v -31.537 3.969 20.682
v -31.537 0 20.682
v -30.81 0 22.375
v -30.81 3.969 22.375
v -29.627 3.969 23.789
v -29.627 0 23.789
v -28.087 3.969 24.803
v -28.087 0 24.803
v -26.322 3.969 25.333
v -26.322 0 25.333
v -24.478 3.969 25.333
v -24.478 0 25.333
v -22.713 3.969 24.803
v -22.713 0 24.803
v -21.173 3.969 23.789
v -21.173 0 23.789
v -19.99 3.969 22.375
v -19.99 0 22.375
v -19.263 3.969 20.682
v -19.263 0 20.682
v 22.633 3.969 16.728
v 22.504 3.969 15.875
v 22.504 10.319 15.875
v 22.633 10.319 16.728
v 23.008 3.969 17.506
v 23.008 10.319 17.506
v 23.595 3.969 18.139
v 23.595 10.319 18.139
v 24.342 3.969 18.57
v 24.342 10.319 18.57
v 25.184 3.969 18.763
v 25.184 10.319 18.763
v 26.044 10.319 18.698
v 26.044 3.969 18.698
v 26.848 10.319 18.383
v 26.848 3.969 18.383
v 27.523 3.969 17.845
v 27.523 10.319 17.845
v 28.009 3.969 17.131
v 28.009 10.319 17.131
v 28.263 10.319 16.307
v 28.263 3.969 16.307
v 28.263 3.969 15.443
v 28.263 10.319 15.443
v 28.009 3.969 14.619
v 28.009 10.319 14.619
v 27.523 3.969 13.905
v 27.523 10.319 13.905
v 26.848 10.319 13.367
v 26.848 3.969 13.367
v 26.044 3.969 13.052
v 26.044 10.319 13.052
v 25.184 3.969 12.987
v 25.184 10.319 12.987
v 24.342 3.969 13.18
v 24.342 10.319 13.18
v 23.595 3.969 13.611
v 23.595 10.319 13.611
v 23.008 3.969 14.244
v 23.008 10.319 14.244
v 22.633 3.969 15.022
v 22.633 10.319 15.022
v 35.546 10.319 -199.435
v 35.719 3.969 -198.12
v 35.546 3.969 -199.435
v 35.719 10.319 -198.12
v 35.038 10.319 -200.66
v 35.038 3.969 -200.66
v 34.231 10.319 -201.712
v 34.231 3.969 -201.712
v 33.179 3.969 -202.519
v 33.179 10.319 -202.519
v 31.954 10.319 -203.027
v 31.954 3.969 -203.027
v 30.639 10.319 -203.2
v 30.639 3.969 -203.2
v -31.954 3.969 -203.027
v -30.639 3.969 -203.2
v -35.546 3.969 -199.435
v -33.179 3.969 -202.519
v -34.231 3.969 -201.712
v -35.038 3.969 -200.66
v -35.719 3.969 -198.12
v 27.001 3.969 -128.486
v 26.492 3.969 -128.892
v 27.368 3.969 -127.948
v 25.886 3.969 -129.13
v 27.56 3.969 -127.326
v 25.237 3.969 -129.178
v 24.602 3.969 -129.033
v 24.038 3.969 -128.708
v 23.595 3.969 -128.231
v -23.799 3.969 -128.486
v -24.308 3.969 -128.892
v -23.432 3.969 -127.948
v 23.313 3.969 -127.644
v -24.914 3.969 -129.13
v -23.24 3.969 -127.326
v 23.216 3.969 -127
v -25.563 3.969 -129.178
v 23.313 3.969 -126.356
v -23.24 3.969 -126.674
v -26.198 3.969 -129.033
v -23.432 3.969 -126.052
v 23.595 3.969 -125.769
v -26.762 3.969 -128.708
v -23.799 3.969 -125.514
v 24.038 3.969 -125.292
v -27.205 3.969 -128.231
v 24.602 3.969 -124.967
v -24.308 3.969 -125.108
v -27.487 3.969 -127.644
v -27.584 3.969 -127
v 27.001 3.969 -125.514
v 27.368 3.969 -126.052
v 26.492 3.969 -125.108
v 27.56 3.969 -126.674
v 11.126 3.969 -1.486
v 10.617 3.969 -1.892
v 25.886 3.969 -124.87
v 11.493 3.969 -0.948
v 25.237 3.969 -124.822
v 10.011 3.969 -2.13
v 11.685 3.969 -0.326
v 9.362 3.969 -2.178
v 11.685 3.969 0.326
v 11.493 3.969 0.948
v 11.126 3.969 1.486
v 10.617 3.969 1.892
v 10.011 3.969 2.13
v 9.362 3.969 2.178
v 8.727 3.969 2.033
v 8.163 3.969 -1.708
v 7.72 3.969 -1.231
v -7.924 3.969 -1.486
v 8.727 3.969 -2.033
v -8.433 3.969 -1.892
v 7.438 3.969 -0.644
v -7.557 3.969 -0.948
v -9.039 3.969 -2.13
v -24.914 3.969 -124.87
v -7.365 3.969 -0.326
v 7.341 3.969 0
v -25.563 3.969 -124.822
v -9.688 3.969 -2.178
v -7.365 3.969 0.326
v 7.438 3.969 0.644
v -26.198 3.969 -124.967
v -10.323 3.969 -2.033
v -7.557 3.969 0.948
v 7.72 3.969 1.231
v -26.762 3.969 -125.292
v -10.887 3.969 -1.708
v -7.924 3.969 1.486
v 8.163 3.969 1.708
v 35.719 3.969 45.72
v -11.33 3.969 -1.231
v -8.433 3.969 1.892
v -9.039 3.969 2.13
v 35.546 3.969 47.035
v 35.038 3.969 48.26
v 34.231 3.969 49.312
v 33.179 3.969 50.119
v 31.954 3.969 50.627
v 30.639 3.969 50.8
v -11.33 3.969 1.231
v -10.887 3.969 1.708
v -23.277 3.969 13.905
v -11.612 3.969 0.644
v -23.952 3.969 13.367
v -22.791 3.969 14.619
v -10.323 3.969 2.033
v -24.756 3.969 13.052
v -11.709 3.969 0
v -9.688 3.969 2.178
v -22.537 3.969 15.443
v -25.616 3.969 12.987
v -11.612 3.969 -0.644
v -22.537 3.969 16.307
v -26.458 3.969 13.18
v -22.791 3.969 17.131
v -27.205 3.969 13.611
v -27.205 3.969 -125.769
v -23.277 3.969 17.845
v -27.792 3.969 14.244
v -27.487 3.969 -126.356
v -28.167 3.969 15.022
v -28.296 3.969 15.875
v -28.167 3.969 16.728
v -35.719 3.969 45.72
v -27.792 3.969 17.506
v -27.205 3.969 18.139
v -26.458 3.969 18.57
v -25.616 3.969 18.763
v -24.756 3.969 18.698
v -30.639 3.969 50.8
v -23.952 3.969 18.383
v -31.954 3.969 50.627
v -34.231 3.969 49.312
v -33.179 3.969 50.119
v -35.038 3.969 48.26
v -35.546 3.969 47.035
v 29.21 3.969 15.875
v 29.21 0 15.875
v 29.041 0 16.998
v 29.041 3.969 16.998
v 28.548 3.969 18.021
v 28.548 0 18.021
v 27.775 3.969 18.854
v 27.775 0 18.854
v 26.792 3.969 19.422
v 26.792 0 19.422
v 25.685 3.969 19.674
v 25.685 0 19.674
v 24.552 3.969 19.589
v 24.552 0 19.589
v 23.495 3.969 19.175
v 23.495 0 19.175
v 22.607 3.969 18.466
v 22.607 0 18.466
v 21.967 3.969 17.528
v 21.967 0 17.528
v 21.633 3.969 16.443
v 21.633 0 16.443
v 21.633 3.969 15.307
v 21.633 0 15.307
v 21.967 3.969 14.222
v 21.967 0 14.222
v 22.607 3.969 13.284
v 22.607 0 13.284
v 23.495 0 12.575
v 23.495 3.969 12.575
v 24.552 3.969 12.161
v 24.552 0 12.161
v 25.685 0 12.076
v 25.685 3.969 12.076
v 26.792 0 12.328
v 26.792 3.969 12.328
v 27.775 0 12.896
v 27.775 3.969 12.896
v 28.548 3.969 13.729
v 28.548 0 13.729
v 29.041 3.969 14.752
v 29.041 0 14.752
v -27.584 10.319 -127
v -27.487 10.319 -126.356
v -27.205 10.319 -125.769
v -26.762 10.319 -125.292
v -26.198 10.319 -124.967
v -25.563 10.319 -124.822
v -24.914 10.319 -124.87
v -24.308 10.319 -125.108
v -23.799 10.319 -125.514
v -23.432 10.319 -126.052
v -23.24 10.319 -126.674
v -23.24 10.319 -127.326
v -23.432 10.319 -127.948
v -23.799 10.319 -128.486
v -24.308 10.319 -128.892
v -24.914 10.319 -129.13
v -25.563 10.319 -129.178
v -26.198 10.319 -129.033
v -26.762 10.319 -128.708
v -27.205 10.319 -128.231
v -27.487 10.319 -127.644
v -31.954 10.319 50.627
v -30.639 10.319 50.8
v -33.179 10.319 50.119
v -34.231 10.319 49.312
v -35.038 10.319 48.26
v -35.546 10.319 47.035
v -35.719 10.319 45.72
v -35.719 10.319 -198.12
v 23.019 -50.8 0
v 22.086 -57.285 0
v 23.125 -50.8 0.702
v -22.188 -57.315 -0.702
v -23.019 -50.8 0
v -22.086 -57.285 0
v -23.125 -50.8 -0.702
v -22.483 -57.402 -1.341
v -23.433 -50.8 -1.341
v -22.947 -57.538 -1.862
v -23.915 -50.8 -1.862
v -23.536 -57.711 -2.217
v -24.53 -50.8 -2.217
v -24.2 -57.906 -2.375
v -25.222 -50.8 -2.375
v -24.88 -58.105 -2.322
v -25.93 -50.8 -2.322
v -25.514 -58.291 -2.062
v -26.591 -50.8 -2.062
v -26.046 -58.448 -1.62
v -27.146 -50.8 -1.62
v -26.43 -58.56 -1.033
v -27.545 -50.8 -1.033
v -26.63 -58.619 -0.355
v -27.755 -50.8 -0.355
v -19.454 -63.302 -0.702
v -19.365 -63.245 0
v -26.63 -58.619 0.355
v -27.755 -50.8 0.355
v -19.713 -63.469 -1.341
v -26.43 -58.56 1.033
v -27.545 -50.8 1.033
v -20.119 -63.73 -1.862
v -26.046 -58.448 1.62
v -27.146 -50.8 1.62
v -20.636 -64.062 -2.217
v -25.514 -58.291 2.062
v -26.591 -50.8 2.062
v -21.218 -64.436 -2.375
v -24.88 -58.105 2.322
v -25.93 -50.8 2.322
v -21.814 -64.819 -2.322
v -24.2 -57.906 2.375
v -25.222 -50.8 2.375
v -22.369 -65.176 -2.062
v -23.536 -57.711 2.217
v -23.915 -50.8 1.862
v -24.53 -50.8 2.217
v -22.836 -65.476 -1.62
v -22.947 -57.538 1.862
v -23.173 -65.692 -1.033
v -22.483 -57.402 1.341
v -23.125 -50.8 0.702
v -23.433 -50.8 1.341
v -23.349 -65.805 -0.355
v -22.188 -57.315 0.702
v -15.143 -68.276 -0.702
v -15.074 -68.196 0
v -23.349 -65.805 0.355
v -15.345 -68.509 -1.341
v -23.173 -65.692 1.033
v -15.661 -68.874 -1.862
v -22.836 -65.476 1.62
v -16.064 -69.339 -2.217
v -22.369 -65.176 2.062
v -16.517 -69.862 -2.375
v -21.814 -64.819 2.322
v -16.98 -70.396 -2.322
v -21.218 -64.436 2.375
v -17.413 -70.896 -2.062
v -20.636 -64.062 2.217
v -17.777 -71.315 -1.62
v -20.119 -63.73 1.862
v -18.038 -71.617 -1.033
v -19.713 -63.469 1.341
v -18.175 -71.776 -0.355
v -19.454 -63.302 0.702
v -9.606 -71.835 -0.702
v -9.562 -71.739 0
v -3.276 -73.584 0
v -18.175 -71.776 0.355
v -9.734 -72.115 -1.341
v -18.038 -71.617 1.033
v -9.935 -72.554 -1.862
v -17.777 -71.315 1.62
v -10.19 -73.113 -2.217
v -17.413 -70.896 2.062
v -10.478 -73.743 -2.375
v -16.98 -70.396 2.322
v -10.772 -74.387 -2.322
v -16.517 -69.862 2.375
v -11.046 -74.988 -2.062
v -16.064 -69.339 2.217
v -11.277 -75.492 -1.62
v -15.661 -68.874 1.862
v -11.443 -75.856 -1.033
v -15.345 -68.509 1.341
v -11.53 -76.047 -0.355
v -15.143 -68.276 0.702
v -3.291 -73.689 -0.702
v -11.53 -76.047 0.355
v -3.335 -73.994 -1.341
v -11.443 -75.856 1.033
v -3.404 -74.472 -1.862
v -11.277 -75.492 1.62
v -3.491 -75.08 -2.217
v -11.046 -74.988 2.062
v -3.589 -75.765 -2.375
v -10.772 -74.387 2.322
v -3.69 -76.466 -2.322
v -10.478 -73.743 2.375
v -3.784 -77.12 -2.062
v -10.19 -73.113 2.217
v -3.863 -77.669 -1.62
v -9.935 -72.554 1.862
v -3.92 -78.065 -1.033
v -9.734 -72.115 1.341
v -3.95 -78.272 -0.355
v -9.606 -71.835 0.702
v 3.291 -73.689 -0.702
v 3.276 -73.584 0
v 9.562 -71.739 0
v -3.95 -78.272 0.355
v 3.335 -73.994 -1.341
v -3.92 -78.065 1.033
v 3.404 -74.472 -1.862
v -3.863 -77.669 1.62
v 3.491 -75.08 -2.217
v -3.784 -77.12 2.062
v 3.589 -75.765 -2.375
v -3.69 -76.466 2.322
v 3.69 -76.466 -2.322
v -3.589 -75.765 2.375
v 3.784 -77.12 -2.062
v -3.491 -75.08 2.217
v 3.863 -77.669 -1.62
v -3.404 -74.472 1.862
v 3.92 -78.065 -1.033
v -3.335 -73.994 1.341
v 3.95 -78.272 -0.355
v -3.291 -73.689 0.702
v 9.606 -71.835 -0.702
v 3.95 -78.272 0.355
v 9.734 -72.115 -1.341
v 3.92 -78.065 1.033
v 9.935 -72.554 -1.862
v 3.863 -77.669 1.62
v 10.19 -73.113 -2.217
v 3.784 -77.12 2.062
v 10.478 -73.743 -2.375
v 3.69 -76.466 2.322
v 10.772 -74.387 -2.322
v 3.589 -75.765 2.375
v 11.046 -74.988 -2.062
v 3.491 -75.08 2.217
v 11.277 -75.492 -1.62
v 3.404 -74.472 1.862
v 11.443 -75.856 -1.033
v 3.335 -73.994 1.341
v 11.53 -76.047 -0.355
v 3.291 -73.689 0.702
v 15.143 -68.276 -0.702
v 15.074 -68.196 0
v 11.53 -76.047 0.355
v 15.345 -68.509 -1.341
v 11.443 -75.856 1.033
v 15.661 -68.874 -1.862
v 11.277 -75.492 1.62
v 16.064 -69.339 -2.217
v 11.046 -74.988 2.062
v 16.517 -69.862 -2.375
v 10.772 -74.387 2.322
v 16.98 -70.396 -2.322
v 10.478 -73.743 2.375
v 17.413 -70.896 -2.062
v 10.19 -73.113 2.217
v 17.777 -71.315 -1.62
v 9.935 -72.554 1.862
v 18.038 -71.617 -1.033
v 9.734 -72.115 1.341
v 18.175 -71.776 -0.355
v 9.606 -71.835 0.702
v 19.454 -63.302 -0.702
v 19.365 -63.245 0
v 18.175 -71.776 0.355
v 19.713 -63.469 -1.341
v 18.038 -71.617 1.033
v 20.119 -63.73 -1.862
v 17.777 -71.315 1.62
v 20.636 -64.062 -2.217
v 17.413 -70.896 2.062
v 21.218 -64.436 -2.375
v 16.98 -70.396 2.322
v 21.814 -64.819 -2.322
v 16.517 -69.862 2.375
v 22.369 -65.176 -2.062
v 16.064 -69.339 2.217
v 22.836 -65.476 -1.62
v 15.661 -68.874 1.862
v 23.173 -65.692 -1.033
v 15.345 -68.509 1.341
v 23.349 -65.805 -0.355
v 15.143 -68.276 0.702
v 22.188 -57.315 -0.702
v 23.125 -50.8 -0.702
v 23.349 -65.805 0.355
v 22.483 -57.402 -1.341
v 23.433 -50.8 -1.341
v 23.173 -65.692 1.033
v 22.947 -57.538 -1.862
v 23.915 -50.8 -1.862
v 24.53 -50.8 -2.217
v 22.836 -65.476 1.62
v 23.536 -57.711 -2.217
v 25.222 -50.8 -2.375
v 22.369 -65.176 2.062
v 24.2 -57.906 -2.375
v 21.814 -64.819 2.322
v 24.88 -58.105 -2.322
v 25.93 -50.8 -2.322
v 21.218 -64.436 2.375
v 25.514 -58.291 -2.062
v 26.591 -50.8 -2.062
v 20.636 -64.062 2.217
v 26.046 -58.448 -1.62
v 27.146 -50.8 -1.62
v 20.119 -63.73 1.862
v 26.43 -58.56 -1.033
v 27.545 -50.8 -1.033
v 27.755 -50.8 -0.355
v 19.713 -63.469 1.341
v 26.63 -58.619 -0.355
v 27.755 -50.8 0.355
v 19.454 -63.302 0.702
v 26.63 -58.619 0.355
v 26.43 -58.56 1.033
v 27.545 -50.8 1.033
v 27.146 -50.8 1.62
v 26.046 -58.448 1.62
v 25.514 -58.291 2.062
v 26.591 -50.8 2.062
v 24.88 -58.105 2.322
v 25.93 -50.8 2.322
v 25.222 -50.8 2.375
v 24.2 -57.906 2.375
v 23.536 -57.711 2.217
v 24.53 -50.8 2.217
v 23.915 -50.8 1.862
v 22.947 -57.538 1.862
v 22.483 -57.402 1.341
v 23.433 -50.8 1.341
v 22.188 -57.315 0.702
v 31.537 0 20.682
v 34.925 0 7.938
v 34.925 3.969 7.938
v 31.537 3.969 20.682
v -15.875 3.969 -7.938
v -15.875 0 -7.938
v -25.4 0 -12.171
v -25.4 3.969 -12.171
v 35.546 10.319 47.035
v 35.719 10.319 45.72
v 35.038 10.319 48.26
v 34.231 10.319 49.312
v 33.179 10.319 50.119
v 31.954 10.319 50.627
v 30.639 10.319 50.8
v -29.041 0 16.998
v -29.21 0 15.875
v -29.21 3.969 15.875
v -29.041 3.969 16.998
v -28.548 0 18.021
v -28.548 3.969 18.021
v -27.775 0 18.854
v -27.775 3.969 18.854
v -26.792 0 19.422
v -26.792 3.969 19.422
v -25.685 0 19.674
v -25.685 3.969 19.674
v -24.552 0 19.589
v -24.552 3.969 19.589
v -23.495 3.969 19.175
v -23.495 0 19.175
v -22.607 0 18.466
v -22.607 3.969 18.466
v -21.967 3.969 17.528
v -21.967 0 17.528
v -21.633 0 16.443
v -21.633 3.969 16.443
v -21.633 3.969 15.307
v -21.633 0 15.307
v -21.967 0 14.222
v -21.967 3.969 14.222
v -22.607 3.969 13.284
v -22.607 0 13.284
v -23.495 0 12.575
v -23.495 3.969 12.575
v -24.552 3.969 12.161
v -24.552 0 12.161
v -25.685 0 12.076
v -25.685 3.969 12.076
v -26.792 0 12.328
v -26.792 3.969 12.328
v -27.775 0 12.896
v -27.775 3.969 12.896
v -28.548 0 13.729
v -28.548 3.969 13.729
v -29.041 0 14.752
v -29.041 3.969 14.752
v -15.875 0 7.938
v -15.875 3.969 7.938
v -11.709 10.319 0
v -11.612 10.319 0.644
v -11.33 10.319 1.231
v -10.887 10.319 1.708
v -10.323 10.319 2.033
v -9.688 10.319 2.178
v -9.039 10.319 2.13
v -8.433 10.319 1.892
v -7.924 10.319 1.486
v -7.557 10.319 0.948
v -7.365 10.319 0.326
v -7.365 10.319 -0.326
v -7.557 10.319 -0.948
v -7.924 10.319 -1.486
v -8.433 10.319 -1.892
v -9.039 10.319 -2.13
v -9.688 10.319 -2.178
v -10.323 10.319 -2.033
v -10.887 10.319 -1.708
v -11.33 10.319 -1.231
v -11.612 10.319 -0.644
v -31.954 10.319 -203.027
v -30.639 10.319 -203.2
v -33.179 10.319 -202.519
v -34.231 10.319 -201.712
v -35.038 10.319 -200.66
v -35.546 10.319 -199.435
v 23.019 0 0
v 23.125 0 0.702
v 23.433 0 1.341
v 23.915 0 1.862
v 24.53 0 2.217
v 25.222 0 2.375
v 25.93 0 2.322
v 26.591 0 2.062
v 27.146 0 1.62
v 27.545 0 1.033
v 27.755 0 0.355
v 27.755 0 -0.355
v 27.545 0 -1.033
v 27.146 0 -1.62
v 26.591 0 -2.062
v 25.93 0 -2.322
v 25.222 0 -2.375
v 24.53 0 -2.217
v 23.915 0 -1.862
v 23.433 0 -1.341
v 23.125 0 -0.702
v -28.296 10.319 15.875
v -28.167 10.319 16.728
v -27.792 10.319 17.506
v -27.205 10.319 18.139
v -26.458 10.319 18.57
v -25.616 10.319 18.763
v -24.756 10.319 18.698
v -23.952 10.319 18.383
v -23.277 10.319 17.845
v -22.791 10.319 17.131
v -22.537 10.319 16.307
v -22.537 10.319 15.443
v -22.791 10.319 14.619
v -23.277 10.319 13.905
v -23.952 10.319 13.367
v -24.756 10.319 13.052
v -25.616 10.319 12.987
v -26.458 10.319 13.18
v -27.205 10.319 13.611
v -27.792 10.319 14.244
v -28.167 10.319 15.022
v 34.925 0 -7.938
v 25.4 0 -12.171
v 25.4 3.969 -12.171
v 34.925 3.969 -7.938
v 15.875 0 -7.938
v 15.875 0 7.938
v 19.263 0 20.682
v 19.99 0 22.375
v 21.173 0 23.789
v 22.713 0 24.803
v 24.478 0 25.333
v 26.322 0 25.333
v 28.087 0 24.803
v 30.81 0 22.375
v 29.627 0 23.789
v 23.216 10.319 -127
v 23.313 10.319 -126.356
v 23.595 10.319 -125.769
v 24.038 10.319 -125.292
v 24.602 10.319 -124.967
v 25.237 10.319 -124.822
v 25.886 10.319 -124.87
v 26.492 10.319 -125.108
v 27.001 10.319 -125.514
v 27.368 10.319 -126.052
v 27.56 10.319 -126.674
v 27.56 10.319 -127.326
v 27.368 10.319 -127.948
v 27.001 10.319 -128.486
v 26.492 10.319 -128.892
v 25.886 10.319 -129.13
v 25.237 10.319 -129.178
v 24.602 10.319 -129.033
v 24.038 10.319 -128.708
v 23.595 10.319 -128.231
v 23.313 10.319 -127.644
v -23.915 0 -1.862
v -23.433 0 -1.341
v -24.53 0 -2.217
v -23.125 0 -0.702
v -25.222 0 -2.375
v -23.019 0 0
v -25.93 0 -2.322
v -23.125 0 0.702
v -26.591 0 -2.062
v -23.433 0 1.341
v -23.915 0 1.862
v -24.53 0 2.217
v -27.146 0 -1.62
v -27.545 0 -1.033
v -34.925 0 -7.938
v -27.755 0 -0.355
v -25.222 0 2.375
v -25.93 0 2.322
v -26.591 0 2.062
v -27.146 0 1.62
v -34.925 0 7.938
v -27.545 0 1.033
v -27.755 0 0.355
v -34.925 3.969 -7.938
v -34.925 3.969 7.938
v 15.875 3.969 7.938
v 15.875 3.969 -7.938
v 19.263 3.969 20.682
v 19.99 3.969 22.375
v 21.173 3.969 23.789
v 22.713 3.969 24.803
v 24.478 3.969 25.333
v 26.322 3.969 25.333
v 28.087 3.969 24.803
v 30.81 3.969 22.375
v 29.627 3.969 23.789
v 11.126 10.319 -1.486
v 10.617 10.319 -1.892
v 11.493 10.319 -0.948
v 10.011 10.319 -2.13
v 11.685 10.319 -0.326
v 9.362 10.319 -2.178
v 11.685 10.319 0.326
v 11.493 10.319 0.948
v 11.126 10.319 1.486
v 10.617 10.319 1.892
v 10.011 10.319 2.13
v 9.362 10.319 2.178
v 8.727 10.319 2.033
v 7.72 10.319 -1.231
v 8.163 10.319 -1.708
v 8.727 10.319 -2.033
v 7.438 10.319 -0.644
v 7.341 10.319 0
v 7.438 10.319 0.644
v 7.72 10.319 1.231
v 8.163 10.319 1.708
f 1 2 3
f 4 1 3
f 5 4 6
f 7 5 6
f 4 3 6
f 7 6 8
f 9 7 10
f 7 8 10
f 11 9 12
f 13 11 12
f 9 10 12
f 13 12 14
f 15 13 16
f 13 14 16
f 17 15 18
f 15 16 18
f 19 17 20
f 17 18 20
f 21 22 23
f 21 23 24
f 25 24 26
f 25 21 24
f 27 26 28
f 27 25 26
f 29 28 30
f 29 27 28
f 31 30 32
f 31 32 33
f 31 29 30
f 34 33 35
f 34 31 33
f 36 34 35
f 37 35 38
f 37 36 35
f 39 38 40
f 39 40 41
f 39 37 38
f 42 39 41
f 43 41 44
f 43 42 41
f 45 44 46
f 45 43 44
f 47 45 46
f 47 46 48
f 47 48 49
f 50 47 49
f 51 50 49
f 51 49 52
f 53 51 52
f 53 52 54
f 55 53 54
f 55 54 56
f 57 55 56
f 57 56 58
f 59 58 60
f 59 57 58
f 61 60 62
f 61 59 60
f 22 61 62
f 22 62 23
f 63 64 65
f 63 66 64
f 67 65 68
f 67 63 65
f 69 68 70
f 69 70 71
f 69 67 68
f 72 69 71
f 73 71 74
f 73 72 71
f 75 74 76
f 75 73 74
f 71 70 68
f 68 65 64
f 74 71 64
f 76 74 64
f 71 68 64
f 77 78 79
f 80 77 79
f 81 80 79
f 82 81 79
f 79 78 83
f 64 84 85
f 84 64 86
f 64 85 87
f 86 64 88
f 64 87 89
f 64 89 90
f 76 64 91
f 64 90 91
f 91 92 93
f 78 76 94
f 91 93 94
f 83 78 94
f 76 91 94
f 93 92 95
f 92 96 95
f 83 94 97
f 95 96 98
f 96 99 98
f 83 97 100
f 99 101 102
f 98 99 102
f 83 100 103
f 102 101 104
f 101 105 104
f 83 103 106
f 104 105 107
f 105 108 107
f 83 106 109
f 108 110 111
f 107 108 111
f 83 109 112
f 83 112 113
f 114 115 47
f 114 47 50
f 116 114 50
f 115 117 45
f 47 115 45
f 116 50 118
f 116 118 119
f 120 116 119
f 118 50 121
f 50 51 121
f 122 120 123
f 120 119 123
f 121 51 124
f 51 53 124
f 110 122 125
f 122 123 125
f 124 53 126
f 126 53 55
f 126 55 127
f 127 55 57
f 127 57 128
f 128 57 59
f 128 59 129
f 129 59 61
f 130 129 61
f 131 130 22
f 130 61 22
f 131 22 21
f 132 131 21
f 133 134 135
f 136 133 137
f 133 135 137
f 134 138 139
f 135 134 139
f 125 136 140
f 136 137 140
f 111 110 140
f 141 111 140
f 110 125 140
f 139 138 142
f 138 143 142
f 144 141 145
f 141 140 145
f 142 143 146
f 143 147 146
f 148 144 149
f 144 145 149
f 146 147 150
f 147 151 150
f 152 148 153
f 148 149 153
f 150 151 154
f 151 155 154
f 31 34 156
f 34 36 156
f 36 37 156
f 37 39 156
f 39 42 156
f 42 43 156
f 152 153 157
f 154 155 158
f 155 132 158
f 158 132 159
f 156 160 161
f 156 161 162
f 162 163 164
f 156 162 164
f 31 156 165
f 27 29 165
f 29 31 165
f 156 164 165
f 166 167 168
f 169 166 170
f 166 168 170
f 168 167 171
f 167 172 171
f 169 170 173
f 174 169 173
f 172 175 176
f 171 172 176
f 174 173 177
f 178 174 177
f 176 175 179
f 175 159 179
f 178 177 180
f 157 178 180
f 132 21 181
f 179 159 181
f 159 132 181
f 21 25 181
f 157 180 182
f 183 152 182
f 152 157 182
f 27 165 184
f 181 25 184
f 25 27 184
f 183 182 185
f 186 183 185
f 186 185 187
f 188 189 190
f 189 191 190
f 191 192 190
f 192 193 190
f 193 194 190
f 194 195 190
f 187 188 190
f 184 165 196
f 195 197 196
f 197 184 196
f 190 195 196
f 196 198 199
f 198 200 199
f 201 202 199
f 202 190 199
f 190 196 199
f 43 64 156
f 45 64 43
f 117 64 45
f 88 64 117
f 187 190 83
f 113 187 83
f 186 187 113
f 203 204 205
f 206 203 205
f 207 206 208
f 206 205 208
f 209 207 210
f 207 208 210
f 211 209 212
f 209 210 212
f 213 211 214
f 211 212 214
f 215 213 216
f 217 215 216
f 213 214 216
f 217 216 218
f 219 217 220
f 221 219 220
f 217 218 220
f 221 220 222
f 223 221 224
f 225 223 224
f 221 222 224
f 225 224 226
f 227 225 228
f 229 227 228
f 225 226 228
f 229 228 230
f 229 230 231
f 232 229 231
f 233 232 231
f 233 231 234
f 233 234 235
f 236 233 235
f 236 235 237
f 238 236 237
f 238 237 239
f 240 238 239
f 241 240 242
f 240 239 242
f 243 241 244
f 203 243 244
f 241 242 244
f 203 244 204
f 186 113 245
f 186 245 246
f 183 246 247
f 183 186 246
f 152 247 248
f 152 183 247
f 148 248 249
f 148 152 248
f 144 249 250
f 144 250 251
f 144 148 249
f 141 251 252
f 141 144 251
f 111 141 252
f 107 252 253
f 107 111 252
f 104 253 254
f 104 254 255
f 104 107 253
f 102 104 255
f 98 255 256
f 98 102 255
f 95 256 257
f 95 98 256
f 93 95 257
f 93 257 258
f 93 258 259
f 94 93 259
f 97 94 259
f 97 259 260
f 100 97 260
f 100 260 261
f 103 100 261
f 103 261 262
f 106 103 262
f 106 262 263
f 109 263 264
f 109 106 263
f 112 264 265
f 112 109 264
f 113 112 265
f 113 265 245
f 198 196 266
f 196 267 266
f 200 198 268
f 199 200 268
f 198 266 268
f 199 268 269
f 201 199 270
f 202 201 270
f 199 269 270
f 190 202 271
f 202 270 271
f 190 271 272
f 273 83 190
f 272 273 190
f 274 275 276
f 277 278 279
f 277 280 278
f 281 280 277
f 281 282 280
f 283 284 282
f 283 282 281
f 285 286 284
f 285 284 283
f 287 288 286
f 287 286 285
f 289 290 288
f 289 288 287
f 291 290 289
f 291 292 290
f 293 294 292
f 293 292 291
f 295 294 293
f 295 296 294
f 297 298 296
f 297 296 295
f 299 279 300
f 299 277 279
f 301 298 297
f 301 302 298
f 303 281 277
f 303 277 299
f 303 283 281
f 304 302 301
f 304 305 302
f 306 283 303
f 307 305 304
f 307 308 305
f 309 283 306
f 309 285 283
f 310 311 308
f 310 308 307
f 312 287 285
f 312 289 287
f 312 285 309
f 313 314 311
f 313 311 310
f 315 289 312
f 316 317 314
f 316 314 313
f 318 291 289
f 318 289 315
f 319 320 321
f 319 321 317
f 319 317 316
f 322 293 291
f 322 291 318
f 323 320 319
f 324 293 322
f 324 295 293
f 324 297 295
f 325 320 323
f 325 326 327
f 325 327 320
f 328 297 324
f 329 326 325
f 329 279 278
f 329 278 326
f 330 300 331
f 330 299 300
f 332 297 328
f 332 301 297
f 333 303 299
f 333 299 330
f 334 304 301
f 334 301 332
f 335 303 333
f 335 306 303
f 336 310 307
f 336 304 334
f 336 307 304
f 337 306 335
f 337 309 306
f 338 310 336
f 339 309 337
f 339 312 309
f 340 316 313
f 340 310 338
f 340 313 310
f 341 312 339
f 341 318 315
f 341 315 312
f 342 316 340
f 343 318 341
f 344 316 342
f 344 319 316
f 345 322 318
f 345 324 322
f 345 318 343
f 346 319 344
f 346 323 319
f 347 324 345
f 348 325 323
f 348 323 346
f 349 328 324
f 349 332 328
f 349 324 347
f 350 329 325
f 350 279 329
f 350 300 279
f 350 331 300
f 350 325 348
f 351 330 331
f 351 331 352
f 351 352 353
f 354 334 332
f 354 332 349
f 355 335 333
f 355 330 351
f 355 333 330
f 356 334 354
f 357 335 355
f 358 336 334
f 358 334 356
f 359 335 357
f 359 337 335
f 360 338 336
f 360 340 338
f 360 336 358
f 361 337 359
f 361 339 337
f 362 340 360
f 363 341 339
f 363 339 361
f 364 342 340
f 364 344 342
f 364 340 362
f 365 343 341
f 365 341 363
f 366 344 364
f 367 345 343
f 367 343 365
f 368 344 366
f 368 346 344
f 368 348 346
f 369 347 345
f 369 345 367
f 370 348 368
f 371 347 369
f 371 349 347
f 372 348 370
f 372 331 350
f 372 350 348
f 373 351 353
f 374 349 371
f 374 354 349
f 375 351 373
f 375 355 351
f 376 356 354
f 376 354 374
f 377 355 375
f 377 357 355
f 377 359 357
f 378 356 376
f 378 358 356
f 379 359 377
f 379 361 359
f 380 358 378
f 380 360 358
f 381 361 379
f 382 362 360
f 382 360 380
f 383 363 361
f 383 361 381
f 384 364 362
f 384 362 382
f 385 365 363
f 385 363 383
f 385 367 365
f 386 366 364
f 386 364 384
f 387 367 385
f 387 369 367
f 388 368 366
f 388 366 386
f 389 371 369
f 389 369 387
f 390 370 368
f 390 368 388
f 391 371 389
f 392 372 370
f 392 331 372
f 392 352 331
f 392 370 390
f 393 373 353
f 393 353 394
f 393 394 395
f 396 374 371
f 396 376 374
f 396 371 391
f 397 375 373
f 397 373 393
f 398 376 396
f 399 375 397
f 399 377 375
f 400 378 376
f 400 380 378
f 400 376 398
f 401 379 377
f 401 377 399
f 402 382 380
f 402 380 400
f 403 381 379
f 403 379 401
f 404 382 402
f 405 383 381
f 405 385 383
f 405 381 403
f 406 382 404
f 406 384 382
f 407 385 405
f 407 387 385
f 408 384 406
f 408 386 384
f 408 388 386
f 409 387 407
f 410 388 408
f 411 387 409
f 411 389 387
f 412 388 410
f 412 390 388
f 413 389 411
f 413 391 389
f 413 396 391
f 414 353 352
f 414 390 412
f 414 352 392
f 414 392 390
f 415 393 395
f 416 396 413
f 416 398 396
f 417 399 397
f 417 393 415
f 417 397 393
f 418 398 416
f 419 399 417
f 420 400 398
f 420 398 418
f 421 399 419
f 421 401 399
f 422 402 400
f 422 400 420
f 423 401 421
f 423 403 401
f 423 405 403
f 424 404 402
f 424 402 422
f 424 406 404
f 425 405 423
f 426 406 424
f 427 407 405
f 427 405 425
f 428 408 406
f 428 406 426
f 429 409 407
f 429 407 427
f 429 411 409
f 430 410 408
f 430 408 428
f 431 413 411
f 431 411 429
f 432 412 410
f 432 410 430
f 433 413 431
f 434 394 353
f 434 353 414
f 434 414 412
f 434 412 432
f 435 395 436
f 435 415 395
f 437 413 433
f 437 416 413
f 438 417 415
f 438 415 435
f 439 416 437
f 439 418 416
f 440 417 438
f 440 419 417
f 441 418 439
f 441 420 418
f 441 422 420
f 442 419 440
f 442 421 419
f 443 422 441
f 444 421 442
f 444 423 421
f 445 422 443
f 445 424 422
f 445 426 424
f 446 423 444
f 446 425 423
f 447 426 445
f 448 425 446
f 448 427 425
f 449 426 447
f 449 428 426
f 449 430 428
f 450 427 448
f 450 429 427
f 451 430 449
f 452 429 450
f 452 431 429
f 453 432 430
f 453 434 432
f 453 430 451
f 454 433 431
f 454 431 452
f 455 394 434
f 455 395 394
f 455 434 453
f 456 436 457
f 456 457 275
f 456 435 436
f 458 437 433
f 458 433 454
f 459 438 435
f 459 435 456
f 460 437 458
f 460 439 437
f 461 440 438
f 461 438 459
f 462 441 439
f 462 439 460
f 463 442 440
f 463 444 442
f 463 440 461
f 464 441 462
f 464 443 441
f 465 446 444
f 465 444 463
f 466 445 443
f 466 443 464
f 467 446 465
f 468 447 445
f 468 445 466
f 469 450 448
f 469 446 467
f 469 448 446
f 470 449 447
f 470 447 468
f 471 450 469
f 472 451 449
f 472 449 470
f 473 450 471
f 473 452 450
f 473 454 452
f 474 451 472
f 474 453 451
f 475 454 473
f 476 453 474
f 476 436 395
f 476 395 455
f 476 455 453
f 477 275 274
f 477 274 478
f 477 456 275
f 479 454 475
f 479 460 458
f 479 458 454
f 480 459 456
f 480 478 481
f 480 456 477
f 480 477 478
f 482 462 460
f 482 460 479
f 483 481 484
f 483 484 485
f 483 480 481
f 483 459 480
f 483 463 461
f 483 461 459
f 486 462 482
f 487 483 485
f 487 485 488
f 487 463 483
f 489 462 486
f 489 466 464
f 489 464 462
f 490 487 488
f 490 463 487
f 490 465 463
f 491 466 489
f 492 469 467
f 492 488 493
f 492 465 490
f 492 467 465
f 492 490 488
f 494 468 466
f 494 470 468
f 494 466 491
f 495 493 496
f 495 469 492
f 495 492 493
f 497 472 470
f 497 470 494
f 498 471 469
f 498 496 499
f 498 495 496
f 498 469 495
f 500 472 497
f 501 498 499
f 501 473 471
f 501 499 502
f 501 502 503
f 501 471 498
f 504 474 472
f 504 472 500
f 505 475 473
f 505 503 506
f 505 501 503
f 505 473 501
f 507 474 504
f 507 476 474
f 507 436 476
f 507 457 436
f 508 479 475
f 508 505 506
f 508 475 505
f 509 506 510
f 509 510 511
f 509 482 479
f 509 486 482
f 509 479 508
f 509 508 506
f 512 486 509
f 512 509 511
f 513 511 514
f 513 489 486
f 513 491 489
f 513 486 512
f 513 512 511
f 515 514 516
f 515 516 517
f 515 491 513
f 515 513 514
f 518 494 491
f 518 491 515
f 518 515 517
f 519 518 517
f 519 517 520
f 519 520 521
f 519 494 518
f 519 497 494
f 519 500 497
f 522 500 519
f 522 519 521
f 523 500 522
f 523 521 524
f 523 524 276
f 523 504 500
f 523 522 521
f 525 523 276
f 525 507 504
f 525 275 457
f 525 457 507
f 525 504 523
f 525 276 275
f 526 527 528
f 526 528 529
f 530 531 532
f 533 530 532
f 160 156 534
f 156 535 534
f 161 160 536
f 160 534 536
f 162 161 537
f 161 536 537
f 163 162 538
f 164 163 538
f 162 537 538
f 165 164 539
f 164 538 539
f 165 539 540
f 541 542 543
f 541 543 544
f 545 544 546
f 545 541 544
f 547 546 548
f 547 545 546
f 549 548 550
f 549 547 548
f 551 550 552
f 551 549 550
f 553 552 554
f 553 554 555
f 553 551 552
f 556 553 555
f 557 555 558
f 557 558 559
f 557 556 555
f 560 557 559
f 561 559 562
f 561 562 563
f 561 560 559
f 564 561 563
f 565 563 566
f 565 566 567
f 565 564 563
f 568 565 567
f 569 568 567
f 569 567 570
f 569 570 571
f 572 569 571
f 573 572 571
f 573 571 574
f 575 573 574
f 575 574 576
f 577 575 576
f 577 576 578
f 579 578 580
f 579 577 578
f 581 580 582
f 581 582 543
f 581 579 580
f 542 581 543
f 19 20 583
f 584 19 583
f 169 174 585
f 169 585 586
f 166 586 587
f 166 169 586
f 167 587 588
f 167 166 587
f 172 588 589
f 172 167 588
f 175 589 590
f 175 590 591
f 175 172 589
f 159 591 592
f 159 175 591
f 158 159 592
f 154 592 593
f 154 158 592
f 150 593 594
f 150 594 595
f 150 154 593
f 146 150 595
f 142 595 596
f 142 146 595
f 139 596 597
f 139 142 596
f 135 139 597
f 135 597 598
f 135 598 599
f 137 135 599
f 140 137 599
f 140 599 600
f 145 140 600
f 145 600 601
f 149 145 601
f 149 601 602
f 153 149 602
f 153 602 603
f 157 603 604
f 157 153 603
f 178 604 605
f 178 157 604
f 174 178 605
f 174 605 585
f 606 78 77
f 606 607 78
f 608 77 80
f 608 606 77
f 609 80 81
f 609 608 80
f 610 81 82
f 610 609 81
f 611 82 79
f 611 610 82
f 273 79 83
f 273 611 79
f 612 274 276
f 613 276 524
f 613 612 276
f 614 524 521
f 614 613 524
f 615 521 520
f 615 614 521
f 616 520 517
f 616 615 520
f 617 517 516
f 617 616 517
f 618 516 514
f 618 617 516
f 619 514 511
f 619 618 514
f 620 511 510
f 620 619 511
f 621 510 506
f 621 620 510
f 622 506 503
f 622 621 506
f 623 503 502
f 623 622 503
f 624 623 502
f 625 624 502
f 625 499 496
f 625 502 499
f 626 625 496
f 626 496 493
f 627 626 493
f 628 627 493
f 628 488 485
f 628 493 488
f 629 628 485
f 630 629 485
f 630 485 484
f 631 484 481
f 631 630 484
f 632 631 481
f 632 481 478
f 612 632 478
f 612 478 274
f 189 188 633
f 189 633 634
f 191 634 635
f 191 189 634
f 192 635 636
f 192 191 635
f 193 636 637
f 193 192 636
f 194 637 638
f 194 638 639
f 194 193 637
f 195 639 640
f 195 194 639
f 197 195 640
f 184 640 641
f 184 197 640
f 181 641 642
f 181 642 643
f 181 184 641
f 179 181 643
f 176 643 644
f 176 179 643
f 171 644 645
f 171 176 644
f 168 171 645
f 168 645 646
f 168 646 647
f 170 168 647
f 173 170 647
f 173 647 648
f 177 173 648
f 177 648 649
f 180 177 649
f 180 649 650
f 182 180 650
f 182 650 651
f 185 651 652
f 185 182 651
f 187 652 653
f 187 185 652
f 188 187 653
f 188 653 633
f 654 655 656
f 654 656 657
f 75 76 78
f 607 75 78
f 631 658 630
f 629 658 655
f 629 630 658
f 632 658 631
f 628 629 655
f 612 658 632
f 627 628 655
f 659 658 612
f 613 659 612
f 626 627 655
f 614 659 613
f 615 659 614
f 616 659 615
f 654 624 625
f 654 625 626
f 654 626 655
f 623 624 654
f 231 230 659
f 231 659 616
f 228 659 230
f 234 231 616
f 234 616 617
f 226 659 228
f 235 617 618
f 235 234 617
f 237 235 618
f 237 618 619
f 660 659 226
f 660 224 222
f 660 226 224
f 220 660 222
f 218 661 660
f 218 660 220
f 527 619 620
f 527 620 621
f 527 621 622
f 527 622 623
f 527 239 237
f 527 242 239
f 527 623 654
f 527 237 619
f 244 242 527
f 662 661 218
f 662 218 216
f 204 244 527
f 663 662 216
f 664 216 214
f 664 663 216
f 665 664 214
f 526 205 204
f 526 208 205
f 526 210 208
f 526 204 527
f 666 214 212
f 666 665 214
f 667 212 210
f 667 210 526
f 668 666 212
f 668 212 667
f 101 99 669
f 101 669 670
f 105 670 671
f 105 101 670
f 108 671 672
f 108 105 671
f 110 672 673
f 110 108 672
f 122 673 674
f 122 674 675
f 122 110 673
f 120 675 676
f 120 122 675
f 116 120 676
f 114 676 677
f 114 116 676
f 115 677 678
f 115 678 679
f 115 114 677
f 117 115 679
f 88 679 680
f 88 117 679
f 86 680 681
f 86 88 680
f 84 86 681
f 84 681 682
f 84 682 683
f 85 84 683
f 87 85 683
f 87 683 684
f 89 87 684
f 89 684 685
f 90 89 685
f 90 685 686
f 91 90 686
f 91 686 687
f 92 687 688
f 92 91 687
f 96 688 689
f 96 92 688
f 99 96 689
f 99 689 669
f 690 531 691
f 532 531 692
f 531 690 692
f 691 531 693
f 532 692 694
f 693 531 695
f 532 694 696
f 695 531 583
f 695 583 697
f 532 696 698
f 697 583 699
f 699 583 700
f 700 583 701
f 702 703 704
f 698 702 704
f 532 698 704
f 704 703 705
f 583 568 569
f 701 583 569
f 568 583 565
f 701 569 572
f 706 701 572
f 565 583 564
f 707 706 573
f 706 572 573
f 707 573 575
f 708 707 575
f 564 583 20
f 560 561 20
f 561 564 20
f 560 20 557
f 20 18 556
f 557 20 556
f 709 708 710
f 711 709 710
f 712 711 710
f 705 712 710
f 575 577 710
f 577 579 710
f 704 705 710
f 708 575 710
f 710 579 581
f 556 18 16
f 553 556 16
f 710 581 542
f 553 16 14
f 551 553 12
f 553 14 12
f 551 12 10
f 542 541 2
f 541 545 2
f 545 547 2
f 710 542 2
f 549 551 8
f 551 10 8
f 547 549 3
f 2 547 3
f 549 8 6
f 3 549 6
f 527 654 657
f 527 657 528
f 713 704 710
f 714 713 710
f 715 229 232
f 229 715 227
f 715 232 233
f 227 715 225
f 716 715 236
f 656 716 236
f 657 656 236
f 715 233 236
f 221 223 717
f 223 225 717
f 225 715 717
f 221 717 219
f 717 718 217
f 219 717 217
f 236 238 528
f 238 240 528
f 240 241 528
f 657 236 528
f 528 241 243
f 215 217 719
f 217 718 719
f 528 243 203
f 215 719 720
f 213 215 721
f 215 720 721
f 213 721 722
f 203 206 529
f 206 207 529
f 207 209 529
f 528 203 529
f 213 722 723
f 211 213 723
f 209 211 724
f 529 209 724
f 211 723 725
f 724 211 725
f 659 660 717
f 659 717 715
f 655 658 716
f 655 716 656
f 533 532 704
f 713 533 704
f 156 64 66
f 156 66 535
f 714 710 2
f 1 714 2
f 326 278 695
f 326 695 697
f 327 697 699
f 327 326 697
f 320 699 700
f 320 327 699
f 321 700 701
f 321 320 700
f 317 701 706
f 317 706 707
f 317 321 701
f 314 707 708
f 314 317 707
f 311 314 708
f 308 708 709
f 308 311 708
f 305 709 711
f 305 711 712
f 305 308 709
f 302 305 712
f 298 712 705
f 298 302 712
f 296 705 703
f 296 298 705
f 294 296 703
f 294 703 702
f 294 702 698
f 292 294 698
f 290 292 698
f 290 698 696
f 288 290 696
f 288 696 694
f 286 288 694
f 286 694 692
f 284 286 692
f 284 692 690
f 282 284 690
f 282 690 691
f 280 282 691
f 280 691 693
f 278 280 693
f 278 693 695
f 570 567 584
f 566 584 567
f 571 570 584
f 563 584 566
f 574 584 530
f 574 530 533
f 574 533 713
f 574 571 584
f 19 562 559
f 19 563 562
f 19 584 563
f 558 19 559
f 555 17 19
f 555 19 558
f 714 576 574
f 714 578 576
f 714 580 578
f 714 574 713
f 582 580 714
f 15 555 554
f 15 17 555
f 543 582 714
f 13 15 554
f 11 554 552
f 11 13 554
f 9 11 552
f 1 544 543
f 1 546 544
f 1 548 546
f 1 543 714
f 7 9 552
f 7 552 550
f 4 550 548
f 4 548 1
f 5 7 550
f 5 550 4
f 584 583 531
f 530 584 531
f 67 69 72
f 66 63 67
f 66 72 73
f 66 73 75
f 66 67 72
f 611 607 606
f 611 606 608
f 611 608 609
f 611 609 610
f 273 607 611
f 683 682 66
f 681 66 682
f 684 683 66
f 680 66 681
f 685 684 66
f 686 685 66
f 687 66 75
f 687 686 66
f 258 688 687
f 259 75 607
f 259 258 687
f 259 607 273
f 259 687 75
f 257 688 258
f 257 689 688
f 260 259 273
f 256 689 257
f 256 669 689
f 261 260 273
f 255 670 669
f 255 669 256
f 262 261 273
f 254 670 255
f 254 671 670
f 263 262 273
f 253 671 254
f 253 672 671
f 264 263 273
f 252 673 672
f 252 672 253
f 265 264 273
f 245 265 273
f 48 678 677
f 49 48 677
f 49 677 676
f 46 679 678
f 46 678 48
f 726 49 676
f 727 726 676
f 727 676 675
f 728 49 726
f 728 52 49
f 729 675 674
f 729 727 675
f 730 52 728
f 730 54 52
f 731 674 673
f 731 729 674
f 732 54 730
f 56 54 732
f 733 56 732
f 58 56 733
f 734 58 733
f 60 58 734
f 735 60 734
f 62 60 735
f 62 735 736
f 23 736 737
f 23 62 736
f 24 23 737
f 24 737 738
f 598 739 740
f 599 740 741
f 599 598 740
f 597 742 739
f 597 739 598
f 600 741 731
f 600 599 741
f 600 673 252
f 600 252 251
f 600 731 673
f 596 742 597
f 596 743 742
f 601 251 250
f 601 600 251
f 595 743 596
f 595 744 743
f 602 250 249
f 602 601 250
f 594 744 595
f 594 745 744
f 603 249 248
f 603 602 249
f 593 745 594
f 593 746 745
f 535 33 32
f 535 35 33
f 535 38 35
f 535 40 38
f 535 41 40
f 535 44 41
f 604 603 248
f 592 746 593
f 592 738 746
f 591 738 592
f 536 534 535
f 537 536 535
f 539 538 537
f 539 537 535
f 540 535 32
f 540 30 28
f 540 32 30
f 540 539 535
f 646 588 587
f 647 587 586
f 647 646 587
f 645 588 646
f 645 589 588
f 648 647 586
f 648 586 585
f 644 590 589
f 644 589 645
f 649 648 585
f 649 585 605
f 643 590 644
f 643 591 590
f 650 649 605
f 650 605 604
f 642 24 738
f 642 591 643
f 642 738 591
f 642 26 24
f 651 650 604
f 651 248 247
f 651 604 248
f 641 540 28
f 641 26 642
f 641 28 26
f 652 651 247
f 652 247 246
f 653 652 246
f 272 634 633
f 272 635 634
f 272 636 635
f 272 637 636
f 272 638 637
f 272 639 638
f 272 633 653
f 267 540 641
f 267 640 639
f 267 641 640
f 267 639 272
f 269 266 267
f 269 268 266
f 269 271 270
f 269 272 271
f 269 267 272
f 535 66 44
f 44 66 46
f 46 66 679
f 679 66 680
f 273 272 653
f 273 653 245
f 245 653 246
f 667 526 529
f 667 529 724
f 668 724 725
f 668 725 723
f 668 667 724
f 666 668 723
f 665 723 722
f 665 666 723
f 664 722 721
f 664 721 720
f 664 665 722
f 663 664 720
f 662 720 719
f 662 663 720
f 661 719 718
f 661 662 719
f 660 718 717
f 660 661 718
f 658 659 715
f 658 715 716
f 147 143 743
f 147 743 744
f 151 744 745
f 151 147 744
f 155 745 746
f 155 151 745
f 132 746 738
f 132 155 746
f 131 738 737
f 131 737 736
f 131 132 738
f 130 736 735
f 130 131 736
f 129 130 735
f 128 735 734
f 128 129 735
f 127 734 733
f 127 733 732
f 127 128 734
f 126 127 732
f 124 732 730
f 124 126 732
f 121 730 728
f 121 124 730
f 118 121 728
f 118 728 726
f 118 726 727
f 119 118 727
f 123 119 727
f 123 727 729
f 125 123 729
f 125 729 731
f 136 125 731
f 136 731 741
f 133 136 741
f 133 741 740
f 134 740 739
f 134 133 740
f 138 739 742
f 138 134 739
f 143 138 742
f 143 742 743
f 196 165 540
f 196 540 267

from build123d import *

# Parameters (mm, degrees)
F0_R     = 2.38125
F3_R     = 3.81
F4_DEPTH = 3.96875
F5_W     = 71.4375
F5_H     = 254
F5_R     = 2.1844
F5_R_2   = 2.8956
F6_DEPTH = 6.35
F7_R     = 5.08


# Not quite as in the source:
# - a pattern or mirror of a feature is missing from the dataset's text; its kind, count and spacing are read off the source's solid


with BuildPart() as f2:
    # F2: sweep along a path in F1
    with BuildLine(Plane.XY) as f2_path:
        Line((-25.4, 0), (-25.4, -50.8))
        ThreePointArc((-25.4, -50.8), (0, -76.2), (25.4, -50.8))
        Line((25.4, -50.8), (25.4, 0))
    # F0 (on Front) → F2 (sweep)
    with BuildSketch(Plane.XZ):
        with Locations((-25.4, 0)):
            Circle(F0_R)
    sweep(path=f2_path.line)

    # F3 (on Front) → F4 (join)
    with BuildSketch(Plane.XZ):
        with BuildLine():
            Line((34.925, 7.9375), (31.5368168318, 20.6815572844))
            ThreePointArc((31.5368168318, 20.6815572844), (25.4, 25.4), (19.2631831682, 20.6815572844))
            Line((19.2631831682, 20.6815572844), (15.875, 7.9375))
            Line((15.875, 7.9375), (15.875, -7.9375))
            Line((15.875, -7.9375), (25.4, -12.1708333333))
            Line((25.4, -12.1708333333), (34.925, -7.9375))
            Line((34.925, -7.9375), (34.925, 7.9375))
        make_face()
        with Locations((25.4, 15.875)):
            Circle(F3_R, mode=Mode.SUBTRACT)
    f4 = extrude(amount=-F4_DEPTH)

    # F4_copies: F4 across plane
    add(f4.mirror(Plane(origin=(0, 0, 0), x_dir=(0, 0, -1), z_dir=(-1, 0, 0))))


with BuildPart() as f6:
    # F5 (on face) → F6 (new body)
    with BuildSketch(Plane(origin=(0, 3.96875, 0), x_dir=(-1, 0, 0), z_dir=(0, 1, 0))):
        with Locations((0, -76.2)):
            Rectangle(F5_W, F5_H)
        with Locations((-25.4, -127)):
            Circle(F5_R, mode=Mode.SUBTRACT)
        with Locations((25.4, -127)):
            Circle(F5_R, mode=Mode.SUBTRACT)
        with Locations((-25.4, 15.875)):
            Circle(F5_R_2, mode=Mode.SUBTRACT)
        with Locations((-9.525, 0)):
            Circle(F5_R, mode=Mode.SUBTRACT)
        with Locations((9.525, 0)):
            Circle(F5_R, mode=Mode.SUBTRACT)
        with Locations((25.4, 15.875)):
            Circle(F5_R_2, mode=Mode.SUBTRACT)
    extrude(amount=F6_DEPTH)

    # F7
    f7_edges = [f6.edges().sort_by_distance(p)[0] for p in [
        (-35.71875, 7.14375, 50.8),
        (35.71875, 7.14375, 50.8),
        (35.71875, 7.14375, -203.2),
        (-35.71875, 7.14375, -203.2),
    ]]
    fillet(f7_edges, radius=F7_R)


solid = Compound([f2.part, f6.part])
